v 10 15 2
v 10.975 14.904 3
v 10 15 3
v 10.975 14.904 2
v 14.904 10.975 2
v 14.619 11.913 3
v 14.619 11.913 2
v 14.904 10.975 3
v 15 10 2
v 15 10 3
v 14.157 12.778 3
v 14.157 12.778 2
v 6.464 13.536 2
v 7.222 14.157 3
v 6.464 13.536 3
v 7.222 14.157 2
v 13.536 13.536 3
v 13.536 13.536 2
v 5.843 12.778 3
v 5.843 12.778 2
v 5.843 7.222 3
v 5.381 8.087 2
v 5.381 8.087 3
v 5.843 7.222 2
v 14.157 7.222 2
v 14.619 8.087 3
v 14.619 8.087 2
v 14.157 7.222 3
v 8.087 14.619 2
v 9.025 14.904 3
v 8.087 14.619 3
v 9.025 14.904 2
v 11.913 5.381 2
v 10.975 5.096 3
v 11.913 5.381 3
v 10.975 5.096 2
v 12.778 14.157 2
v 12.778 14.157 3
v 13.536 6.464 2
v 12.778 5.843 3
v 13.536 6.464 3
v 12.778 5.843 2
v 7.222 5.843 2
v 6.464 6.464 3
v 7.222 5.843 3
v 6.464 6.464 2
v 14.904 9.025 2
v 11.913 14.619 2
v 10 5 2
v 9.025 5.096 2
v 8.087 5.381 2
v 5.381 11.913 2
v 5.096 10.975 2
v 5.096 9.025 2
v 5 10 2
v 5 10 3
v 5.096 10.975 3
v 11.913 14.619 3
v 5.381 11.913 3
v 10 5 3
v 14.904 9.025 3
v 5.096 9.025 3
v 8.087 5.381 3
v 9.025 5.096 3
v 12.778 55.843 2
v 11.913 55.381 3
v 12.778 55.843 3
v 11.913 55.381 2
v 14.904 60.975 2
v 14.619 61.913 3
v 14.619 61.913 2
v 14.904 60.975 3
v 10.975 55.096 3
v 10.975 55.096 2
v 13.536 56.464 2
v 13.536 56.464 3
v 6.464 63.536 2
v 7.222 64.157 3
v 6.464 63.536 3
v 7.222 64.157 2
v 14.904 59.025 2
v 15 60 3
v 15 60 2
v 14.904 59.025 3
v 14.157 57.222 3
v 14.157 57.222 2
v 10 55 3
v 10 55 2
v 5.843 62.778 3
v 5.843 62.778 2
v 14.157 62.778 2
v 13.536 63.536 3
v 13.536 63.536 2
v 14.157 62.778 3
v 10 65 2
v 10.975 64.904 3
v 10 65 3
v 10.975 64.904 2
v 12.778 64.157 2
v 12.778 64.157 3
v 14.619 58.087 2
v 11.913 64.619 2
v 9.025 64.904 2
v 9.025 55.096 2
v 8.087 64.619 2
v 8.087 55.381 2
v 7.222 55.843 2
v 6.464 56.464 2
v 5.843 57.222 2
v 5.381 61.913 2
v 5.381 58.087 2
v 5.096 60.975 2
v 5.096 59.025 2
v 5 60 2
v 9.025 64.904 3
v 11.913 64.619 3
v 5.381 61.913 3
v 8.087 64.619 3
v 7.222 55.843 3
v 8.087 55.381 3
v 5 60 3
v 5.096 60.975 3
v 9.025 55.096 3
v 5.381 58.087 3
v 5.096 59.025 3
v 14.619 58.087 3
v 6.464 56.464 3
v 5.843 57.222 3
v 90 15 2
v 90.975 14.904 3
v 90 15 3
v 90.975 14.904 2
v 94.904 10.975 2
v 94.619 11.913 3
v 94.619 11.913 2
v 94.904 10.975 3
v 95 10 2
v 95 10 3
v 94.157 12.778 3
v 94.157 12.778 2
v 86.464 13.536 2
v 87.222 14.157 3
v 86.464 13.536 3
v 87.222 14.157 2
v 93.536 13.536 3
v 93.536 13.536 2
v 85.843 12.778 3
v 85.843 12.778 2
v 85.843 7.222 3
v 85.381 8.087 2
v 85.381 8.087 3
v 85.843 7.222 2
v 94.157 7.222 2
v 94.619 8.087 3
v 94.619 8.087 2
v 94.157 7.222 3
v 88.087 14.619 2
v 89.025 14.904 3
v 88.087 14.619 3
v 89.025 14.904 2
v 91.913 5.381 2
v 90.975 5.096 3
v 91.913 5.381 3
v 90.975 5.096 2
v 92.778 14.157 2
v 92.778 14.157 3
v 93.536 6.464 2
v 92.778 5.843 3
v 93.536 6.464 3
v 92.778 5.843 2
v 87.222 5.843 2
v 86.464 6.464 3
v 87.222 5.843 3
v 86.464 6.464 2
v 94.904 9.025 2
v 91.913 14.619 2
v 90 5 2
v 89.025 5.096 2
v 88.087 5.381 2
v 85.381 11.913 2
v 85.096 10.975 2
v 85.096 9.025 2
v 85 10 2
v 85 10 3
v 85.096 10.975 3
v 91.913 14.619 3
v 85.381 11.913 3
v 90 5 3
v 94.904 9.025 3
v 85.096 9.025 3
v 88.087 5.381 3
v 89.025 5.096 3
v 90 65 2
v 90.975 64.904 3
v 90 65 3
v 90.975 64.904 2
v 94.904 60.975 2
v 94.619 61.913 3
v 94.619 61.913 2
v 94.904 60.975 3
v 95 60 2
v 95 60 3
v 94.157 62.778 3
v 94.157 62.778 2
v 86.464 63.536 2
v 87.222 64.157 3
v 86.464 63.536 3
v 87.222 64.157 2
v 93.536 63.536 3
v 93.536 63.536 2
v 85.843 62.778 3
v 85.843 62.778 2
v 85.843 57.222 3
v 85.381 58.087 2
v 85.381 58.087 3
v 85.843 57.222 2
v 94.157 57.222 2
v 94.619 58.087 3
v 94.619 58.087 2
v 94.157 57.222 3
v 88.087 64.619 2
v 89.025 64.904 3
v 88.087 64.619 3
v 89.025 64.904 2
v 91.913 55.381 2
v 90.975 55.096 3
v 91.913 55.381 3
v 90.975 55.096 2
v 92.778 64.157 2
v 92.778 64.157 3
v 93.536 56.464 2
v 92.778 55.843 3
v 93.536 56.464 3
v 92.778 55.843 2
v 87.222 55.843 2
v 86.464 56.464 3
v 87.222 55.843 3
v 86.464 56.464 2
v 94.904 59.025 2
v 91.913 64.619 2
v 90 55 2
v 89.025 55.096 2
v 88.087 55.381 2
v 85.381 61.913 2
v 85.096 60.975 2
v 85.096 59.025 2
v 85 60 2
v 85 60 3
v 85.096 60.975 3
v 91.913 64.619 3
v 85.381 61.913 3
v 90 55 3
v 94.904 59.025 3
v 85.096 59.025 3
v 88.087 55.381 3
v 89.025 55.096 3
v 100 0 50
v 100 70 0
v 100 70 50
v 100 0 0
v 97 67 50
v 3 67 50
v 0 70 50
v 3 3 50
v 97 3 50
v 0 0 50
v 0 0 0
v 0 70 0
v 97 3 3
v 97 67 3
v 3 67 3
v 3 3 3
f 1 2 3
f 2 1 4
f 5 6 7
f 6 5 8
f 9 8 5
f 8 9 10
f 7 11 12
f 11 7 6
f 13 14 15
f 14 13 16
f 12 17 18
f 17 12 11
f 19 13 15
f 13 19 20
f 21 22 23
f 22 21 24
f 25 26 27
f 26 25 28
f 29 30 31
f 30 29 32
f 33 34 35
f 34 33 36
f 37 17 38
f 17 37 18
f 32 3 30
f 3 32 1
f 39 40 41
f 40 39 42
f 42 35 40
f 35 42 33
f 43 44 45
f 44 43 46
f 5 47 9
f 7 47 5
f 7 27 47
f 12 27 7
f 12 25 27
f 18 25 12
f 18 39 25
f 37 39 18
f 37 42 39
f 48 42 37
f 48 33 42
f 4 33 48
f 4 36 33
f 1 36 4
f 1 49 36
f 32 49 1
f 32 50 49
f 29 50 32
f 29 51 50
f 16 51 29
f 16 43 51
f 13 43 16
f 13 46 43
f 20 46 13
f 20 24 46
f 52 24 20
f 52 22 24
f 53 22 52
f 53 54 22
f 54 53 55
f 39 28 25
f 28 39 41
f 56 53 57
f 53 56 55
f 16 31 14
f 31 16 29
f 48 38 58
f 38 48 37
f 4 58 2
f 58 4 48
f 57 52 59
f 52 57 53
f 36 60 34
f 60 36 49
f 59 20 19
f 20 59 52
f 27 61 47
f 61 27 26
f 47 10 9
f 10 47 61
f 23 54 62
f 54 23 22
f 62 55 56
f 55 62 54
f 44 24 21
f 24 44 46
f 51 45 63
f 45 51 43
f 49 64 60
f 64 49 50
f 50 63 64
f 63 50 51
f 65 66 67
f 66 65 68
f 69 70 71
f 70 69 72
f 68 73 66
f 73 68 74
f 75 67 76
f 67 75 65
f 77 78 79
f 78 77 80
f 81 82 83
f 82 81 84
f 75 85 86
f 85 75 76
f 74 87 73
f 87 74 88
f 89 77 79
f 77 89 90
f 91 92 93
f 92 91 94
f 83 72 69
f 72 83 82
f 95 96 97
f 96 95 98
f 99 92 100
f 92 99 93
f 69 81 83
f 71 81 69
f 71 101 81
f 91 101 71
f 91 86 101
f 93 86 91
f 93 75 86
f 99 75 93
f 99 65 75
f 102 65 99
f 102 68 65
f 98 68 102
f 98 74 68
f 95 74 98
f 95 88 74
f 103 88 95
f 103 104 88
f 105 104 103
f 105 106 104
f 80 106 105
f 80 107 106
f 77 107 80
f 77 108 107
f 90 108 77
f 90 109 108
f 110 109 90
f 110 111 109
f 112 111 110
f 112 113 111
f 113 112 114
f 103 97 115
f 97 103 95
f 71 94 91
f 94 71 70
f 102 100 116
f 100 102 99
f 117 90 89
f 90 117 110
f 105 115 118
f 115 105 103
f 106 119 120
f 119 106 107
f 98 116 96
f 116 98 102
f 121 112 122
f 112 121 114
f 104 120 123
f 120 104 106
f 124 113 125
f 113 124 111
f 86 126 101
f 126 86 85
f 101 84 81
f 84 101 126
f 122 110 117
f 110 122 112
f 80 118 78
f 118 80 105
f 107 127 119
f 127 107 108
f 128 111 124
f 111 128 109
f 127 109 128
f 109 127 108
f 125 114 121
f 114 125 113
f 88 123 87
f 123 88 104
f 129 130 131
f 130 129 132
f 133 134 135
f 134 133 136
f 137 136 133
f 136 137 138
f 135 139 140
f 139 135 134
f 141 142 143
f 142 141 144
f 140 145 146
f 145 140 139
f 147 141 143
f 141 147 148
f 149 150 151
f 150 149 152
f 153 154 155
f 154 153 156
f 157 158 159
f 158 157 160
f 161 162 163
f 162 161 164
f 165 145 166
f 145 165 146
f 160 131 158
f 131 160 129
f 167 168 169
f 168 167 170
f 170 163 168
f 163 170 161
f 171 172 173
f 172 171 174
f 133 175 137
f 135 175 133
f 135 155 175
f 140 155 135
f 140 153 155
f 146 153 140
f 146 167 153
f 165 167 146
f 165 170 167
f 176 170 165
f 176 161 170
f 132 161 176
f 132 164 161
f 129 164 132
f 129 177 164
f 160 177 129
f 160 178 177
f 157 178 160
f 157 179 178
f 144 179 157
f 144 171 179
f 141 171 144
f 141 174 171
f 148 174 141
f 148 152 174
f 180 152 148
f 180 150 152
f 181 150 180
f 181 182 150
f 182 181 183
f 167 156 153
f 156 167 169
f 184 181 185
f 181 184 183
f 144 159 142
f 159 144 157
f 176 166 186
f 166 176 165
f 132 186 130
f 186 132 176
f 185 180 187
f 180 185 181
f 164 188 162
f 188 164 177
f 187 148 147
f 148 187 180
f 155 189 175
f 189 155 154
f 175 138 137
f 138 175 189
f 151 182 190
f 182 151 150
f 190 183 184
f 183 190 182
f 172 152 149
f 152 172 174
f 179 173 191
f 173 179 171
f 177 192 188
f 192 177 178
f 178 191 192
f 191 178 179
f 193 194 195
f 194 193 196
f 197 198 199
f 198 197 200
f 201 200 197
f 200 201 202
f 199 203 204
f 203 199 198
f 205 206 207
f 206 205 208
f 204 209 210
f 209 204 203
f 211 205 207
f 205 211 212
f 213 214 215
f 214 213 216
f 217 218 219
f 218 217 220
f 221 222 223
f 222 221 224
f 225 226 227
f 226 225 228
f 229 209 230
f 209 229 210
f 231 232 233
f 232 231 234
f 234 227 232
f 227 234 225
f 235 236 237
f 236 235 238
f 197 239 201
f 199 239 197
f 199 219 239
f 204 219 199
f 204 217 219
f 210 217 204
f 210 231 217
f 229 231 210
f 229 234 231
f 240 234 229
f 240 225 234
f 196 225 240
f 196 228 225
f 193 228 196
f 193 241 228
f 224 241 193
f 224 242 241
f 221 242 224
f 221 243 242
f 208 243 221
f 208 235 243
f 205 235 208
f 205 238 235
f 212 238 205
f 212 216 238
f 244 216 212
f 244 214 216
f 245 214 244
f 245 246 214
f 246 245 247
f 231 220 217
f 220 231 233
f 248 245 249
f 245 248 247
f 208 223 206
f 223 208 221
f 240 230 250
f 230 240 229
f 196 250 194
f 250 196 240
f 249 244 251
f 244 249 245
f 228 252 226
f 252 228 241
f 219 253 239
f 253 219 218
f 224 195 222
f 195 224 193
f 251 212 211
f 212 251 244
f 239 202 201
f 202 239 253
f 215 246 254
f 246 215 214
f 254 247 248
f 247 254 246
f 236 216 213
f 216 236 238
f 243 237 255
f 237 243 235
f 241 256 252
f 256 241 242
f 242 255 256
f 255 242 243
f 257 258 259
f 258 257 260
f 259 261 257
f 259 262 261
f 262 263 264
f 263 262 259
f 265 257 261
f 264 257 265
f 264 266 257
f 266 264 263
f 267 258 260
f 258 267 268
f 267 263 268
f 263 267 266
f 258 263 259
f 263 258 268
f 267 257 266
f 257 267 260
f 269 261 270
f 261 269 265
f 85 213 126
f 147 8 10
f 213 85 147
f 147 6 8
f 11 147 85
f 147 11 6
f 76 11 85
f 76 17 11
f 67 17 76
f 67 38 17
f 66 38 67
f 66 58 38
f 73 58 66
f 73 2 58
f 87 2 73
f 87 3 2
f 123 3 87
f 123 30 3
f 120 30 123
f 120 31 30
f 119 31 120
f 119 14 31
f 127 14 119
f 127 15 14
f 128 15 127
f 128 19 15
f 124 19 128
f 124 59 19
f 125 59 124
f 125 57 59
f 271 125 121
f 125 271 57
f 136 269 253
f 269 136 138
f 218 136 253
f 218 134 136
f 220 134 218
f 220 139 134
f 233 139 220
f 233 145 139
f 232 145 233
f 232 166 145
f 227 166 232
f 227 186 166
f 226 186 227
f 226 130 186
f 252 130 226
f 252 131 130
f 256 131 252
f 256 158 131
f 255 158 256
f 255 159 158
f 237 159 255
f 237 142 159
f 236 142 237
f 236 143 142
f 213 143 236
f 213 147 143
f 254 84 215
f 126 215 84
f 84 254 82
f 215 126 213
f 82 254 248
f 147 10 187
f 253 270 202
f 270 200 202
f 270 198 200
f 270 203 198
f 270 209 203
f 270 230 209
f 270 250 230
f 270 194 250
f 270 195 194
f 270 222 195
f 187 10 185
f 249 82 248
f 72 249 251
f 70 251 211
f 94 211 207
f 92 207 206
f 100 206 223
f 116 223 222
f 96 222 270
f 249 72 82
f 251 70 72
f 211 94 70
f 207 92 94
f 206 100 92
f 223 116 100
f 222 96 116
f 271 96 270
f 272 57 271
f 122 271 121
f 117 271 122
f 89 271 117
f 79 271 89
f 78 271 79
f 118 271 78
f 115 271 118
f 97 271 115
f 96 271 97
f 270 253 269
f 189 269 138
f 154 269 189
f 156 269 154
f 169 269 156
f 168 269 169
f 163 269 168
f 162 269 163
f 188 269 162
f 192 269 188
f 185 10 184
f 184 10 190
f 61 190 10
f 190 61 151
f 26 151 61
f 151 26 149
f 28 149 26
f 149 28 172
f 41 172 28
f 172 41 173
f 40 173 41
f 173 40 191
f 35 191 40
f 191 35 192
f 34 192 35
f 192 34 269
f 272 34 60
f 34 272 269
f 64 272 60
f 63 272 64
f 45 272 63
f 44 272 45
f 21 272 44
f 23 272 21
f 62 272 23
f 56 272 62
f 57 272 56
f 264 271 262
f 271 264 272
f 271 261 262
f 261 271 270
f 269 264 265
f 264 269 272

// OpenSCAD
$fn = 32;

// ----------------------------------------------------------------------
// Enclosure box: bosses enclosure
// ----------------------------------------------------------------------

// --- parameters (mm) ---
box_l = 100;              // outer length, X
box_w = 70;               // outer width, Y
box_h = 50;               // outer height
wall_t = 3;               // wall thickness
boss_r = 5;               // corner boss radius
hole_r = 1.5;             // boss screw hole radius
boss_in = 10;             // boss inset from the corners

inner_h = box_h - wall_t;  // cavity depth
boss_h = inner_h - 2;  // corner boss height

difference() {
  cube([box_l, box_w, box_h]);
  translate([wall_t, wall_t, wall_t])
    cube([box_l - 2 * wall_t, box_w - 2 * wall_t, box_h]);
  for (sx = [0, 1], sy = [0, 1])
    translate([sx ? box_l - boss_in : boss_in,
               sy ? box_w - boss_in : boss_in, wall_t - 1]) {
      cylinder(r = boss_r, h = boss_h);
      translate([0, 0, boss_h - 4])
        cylinder(r = hole_r, h = 5);
    }
}
